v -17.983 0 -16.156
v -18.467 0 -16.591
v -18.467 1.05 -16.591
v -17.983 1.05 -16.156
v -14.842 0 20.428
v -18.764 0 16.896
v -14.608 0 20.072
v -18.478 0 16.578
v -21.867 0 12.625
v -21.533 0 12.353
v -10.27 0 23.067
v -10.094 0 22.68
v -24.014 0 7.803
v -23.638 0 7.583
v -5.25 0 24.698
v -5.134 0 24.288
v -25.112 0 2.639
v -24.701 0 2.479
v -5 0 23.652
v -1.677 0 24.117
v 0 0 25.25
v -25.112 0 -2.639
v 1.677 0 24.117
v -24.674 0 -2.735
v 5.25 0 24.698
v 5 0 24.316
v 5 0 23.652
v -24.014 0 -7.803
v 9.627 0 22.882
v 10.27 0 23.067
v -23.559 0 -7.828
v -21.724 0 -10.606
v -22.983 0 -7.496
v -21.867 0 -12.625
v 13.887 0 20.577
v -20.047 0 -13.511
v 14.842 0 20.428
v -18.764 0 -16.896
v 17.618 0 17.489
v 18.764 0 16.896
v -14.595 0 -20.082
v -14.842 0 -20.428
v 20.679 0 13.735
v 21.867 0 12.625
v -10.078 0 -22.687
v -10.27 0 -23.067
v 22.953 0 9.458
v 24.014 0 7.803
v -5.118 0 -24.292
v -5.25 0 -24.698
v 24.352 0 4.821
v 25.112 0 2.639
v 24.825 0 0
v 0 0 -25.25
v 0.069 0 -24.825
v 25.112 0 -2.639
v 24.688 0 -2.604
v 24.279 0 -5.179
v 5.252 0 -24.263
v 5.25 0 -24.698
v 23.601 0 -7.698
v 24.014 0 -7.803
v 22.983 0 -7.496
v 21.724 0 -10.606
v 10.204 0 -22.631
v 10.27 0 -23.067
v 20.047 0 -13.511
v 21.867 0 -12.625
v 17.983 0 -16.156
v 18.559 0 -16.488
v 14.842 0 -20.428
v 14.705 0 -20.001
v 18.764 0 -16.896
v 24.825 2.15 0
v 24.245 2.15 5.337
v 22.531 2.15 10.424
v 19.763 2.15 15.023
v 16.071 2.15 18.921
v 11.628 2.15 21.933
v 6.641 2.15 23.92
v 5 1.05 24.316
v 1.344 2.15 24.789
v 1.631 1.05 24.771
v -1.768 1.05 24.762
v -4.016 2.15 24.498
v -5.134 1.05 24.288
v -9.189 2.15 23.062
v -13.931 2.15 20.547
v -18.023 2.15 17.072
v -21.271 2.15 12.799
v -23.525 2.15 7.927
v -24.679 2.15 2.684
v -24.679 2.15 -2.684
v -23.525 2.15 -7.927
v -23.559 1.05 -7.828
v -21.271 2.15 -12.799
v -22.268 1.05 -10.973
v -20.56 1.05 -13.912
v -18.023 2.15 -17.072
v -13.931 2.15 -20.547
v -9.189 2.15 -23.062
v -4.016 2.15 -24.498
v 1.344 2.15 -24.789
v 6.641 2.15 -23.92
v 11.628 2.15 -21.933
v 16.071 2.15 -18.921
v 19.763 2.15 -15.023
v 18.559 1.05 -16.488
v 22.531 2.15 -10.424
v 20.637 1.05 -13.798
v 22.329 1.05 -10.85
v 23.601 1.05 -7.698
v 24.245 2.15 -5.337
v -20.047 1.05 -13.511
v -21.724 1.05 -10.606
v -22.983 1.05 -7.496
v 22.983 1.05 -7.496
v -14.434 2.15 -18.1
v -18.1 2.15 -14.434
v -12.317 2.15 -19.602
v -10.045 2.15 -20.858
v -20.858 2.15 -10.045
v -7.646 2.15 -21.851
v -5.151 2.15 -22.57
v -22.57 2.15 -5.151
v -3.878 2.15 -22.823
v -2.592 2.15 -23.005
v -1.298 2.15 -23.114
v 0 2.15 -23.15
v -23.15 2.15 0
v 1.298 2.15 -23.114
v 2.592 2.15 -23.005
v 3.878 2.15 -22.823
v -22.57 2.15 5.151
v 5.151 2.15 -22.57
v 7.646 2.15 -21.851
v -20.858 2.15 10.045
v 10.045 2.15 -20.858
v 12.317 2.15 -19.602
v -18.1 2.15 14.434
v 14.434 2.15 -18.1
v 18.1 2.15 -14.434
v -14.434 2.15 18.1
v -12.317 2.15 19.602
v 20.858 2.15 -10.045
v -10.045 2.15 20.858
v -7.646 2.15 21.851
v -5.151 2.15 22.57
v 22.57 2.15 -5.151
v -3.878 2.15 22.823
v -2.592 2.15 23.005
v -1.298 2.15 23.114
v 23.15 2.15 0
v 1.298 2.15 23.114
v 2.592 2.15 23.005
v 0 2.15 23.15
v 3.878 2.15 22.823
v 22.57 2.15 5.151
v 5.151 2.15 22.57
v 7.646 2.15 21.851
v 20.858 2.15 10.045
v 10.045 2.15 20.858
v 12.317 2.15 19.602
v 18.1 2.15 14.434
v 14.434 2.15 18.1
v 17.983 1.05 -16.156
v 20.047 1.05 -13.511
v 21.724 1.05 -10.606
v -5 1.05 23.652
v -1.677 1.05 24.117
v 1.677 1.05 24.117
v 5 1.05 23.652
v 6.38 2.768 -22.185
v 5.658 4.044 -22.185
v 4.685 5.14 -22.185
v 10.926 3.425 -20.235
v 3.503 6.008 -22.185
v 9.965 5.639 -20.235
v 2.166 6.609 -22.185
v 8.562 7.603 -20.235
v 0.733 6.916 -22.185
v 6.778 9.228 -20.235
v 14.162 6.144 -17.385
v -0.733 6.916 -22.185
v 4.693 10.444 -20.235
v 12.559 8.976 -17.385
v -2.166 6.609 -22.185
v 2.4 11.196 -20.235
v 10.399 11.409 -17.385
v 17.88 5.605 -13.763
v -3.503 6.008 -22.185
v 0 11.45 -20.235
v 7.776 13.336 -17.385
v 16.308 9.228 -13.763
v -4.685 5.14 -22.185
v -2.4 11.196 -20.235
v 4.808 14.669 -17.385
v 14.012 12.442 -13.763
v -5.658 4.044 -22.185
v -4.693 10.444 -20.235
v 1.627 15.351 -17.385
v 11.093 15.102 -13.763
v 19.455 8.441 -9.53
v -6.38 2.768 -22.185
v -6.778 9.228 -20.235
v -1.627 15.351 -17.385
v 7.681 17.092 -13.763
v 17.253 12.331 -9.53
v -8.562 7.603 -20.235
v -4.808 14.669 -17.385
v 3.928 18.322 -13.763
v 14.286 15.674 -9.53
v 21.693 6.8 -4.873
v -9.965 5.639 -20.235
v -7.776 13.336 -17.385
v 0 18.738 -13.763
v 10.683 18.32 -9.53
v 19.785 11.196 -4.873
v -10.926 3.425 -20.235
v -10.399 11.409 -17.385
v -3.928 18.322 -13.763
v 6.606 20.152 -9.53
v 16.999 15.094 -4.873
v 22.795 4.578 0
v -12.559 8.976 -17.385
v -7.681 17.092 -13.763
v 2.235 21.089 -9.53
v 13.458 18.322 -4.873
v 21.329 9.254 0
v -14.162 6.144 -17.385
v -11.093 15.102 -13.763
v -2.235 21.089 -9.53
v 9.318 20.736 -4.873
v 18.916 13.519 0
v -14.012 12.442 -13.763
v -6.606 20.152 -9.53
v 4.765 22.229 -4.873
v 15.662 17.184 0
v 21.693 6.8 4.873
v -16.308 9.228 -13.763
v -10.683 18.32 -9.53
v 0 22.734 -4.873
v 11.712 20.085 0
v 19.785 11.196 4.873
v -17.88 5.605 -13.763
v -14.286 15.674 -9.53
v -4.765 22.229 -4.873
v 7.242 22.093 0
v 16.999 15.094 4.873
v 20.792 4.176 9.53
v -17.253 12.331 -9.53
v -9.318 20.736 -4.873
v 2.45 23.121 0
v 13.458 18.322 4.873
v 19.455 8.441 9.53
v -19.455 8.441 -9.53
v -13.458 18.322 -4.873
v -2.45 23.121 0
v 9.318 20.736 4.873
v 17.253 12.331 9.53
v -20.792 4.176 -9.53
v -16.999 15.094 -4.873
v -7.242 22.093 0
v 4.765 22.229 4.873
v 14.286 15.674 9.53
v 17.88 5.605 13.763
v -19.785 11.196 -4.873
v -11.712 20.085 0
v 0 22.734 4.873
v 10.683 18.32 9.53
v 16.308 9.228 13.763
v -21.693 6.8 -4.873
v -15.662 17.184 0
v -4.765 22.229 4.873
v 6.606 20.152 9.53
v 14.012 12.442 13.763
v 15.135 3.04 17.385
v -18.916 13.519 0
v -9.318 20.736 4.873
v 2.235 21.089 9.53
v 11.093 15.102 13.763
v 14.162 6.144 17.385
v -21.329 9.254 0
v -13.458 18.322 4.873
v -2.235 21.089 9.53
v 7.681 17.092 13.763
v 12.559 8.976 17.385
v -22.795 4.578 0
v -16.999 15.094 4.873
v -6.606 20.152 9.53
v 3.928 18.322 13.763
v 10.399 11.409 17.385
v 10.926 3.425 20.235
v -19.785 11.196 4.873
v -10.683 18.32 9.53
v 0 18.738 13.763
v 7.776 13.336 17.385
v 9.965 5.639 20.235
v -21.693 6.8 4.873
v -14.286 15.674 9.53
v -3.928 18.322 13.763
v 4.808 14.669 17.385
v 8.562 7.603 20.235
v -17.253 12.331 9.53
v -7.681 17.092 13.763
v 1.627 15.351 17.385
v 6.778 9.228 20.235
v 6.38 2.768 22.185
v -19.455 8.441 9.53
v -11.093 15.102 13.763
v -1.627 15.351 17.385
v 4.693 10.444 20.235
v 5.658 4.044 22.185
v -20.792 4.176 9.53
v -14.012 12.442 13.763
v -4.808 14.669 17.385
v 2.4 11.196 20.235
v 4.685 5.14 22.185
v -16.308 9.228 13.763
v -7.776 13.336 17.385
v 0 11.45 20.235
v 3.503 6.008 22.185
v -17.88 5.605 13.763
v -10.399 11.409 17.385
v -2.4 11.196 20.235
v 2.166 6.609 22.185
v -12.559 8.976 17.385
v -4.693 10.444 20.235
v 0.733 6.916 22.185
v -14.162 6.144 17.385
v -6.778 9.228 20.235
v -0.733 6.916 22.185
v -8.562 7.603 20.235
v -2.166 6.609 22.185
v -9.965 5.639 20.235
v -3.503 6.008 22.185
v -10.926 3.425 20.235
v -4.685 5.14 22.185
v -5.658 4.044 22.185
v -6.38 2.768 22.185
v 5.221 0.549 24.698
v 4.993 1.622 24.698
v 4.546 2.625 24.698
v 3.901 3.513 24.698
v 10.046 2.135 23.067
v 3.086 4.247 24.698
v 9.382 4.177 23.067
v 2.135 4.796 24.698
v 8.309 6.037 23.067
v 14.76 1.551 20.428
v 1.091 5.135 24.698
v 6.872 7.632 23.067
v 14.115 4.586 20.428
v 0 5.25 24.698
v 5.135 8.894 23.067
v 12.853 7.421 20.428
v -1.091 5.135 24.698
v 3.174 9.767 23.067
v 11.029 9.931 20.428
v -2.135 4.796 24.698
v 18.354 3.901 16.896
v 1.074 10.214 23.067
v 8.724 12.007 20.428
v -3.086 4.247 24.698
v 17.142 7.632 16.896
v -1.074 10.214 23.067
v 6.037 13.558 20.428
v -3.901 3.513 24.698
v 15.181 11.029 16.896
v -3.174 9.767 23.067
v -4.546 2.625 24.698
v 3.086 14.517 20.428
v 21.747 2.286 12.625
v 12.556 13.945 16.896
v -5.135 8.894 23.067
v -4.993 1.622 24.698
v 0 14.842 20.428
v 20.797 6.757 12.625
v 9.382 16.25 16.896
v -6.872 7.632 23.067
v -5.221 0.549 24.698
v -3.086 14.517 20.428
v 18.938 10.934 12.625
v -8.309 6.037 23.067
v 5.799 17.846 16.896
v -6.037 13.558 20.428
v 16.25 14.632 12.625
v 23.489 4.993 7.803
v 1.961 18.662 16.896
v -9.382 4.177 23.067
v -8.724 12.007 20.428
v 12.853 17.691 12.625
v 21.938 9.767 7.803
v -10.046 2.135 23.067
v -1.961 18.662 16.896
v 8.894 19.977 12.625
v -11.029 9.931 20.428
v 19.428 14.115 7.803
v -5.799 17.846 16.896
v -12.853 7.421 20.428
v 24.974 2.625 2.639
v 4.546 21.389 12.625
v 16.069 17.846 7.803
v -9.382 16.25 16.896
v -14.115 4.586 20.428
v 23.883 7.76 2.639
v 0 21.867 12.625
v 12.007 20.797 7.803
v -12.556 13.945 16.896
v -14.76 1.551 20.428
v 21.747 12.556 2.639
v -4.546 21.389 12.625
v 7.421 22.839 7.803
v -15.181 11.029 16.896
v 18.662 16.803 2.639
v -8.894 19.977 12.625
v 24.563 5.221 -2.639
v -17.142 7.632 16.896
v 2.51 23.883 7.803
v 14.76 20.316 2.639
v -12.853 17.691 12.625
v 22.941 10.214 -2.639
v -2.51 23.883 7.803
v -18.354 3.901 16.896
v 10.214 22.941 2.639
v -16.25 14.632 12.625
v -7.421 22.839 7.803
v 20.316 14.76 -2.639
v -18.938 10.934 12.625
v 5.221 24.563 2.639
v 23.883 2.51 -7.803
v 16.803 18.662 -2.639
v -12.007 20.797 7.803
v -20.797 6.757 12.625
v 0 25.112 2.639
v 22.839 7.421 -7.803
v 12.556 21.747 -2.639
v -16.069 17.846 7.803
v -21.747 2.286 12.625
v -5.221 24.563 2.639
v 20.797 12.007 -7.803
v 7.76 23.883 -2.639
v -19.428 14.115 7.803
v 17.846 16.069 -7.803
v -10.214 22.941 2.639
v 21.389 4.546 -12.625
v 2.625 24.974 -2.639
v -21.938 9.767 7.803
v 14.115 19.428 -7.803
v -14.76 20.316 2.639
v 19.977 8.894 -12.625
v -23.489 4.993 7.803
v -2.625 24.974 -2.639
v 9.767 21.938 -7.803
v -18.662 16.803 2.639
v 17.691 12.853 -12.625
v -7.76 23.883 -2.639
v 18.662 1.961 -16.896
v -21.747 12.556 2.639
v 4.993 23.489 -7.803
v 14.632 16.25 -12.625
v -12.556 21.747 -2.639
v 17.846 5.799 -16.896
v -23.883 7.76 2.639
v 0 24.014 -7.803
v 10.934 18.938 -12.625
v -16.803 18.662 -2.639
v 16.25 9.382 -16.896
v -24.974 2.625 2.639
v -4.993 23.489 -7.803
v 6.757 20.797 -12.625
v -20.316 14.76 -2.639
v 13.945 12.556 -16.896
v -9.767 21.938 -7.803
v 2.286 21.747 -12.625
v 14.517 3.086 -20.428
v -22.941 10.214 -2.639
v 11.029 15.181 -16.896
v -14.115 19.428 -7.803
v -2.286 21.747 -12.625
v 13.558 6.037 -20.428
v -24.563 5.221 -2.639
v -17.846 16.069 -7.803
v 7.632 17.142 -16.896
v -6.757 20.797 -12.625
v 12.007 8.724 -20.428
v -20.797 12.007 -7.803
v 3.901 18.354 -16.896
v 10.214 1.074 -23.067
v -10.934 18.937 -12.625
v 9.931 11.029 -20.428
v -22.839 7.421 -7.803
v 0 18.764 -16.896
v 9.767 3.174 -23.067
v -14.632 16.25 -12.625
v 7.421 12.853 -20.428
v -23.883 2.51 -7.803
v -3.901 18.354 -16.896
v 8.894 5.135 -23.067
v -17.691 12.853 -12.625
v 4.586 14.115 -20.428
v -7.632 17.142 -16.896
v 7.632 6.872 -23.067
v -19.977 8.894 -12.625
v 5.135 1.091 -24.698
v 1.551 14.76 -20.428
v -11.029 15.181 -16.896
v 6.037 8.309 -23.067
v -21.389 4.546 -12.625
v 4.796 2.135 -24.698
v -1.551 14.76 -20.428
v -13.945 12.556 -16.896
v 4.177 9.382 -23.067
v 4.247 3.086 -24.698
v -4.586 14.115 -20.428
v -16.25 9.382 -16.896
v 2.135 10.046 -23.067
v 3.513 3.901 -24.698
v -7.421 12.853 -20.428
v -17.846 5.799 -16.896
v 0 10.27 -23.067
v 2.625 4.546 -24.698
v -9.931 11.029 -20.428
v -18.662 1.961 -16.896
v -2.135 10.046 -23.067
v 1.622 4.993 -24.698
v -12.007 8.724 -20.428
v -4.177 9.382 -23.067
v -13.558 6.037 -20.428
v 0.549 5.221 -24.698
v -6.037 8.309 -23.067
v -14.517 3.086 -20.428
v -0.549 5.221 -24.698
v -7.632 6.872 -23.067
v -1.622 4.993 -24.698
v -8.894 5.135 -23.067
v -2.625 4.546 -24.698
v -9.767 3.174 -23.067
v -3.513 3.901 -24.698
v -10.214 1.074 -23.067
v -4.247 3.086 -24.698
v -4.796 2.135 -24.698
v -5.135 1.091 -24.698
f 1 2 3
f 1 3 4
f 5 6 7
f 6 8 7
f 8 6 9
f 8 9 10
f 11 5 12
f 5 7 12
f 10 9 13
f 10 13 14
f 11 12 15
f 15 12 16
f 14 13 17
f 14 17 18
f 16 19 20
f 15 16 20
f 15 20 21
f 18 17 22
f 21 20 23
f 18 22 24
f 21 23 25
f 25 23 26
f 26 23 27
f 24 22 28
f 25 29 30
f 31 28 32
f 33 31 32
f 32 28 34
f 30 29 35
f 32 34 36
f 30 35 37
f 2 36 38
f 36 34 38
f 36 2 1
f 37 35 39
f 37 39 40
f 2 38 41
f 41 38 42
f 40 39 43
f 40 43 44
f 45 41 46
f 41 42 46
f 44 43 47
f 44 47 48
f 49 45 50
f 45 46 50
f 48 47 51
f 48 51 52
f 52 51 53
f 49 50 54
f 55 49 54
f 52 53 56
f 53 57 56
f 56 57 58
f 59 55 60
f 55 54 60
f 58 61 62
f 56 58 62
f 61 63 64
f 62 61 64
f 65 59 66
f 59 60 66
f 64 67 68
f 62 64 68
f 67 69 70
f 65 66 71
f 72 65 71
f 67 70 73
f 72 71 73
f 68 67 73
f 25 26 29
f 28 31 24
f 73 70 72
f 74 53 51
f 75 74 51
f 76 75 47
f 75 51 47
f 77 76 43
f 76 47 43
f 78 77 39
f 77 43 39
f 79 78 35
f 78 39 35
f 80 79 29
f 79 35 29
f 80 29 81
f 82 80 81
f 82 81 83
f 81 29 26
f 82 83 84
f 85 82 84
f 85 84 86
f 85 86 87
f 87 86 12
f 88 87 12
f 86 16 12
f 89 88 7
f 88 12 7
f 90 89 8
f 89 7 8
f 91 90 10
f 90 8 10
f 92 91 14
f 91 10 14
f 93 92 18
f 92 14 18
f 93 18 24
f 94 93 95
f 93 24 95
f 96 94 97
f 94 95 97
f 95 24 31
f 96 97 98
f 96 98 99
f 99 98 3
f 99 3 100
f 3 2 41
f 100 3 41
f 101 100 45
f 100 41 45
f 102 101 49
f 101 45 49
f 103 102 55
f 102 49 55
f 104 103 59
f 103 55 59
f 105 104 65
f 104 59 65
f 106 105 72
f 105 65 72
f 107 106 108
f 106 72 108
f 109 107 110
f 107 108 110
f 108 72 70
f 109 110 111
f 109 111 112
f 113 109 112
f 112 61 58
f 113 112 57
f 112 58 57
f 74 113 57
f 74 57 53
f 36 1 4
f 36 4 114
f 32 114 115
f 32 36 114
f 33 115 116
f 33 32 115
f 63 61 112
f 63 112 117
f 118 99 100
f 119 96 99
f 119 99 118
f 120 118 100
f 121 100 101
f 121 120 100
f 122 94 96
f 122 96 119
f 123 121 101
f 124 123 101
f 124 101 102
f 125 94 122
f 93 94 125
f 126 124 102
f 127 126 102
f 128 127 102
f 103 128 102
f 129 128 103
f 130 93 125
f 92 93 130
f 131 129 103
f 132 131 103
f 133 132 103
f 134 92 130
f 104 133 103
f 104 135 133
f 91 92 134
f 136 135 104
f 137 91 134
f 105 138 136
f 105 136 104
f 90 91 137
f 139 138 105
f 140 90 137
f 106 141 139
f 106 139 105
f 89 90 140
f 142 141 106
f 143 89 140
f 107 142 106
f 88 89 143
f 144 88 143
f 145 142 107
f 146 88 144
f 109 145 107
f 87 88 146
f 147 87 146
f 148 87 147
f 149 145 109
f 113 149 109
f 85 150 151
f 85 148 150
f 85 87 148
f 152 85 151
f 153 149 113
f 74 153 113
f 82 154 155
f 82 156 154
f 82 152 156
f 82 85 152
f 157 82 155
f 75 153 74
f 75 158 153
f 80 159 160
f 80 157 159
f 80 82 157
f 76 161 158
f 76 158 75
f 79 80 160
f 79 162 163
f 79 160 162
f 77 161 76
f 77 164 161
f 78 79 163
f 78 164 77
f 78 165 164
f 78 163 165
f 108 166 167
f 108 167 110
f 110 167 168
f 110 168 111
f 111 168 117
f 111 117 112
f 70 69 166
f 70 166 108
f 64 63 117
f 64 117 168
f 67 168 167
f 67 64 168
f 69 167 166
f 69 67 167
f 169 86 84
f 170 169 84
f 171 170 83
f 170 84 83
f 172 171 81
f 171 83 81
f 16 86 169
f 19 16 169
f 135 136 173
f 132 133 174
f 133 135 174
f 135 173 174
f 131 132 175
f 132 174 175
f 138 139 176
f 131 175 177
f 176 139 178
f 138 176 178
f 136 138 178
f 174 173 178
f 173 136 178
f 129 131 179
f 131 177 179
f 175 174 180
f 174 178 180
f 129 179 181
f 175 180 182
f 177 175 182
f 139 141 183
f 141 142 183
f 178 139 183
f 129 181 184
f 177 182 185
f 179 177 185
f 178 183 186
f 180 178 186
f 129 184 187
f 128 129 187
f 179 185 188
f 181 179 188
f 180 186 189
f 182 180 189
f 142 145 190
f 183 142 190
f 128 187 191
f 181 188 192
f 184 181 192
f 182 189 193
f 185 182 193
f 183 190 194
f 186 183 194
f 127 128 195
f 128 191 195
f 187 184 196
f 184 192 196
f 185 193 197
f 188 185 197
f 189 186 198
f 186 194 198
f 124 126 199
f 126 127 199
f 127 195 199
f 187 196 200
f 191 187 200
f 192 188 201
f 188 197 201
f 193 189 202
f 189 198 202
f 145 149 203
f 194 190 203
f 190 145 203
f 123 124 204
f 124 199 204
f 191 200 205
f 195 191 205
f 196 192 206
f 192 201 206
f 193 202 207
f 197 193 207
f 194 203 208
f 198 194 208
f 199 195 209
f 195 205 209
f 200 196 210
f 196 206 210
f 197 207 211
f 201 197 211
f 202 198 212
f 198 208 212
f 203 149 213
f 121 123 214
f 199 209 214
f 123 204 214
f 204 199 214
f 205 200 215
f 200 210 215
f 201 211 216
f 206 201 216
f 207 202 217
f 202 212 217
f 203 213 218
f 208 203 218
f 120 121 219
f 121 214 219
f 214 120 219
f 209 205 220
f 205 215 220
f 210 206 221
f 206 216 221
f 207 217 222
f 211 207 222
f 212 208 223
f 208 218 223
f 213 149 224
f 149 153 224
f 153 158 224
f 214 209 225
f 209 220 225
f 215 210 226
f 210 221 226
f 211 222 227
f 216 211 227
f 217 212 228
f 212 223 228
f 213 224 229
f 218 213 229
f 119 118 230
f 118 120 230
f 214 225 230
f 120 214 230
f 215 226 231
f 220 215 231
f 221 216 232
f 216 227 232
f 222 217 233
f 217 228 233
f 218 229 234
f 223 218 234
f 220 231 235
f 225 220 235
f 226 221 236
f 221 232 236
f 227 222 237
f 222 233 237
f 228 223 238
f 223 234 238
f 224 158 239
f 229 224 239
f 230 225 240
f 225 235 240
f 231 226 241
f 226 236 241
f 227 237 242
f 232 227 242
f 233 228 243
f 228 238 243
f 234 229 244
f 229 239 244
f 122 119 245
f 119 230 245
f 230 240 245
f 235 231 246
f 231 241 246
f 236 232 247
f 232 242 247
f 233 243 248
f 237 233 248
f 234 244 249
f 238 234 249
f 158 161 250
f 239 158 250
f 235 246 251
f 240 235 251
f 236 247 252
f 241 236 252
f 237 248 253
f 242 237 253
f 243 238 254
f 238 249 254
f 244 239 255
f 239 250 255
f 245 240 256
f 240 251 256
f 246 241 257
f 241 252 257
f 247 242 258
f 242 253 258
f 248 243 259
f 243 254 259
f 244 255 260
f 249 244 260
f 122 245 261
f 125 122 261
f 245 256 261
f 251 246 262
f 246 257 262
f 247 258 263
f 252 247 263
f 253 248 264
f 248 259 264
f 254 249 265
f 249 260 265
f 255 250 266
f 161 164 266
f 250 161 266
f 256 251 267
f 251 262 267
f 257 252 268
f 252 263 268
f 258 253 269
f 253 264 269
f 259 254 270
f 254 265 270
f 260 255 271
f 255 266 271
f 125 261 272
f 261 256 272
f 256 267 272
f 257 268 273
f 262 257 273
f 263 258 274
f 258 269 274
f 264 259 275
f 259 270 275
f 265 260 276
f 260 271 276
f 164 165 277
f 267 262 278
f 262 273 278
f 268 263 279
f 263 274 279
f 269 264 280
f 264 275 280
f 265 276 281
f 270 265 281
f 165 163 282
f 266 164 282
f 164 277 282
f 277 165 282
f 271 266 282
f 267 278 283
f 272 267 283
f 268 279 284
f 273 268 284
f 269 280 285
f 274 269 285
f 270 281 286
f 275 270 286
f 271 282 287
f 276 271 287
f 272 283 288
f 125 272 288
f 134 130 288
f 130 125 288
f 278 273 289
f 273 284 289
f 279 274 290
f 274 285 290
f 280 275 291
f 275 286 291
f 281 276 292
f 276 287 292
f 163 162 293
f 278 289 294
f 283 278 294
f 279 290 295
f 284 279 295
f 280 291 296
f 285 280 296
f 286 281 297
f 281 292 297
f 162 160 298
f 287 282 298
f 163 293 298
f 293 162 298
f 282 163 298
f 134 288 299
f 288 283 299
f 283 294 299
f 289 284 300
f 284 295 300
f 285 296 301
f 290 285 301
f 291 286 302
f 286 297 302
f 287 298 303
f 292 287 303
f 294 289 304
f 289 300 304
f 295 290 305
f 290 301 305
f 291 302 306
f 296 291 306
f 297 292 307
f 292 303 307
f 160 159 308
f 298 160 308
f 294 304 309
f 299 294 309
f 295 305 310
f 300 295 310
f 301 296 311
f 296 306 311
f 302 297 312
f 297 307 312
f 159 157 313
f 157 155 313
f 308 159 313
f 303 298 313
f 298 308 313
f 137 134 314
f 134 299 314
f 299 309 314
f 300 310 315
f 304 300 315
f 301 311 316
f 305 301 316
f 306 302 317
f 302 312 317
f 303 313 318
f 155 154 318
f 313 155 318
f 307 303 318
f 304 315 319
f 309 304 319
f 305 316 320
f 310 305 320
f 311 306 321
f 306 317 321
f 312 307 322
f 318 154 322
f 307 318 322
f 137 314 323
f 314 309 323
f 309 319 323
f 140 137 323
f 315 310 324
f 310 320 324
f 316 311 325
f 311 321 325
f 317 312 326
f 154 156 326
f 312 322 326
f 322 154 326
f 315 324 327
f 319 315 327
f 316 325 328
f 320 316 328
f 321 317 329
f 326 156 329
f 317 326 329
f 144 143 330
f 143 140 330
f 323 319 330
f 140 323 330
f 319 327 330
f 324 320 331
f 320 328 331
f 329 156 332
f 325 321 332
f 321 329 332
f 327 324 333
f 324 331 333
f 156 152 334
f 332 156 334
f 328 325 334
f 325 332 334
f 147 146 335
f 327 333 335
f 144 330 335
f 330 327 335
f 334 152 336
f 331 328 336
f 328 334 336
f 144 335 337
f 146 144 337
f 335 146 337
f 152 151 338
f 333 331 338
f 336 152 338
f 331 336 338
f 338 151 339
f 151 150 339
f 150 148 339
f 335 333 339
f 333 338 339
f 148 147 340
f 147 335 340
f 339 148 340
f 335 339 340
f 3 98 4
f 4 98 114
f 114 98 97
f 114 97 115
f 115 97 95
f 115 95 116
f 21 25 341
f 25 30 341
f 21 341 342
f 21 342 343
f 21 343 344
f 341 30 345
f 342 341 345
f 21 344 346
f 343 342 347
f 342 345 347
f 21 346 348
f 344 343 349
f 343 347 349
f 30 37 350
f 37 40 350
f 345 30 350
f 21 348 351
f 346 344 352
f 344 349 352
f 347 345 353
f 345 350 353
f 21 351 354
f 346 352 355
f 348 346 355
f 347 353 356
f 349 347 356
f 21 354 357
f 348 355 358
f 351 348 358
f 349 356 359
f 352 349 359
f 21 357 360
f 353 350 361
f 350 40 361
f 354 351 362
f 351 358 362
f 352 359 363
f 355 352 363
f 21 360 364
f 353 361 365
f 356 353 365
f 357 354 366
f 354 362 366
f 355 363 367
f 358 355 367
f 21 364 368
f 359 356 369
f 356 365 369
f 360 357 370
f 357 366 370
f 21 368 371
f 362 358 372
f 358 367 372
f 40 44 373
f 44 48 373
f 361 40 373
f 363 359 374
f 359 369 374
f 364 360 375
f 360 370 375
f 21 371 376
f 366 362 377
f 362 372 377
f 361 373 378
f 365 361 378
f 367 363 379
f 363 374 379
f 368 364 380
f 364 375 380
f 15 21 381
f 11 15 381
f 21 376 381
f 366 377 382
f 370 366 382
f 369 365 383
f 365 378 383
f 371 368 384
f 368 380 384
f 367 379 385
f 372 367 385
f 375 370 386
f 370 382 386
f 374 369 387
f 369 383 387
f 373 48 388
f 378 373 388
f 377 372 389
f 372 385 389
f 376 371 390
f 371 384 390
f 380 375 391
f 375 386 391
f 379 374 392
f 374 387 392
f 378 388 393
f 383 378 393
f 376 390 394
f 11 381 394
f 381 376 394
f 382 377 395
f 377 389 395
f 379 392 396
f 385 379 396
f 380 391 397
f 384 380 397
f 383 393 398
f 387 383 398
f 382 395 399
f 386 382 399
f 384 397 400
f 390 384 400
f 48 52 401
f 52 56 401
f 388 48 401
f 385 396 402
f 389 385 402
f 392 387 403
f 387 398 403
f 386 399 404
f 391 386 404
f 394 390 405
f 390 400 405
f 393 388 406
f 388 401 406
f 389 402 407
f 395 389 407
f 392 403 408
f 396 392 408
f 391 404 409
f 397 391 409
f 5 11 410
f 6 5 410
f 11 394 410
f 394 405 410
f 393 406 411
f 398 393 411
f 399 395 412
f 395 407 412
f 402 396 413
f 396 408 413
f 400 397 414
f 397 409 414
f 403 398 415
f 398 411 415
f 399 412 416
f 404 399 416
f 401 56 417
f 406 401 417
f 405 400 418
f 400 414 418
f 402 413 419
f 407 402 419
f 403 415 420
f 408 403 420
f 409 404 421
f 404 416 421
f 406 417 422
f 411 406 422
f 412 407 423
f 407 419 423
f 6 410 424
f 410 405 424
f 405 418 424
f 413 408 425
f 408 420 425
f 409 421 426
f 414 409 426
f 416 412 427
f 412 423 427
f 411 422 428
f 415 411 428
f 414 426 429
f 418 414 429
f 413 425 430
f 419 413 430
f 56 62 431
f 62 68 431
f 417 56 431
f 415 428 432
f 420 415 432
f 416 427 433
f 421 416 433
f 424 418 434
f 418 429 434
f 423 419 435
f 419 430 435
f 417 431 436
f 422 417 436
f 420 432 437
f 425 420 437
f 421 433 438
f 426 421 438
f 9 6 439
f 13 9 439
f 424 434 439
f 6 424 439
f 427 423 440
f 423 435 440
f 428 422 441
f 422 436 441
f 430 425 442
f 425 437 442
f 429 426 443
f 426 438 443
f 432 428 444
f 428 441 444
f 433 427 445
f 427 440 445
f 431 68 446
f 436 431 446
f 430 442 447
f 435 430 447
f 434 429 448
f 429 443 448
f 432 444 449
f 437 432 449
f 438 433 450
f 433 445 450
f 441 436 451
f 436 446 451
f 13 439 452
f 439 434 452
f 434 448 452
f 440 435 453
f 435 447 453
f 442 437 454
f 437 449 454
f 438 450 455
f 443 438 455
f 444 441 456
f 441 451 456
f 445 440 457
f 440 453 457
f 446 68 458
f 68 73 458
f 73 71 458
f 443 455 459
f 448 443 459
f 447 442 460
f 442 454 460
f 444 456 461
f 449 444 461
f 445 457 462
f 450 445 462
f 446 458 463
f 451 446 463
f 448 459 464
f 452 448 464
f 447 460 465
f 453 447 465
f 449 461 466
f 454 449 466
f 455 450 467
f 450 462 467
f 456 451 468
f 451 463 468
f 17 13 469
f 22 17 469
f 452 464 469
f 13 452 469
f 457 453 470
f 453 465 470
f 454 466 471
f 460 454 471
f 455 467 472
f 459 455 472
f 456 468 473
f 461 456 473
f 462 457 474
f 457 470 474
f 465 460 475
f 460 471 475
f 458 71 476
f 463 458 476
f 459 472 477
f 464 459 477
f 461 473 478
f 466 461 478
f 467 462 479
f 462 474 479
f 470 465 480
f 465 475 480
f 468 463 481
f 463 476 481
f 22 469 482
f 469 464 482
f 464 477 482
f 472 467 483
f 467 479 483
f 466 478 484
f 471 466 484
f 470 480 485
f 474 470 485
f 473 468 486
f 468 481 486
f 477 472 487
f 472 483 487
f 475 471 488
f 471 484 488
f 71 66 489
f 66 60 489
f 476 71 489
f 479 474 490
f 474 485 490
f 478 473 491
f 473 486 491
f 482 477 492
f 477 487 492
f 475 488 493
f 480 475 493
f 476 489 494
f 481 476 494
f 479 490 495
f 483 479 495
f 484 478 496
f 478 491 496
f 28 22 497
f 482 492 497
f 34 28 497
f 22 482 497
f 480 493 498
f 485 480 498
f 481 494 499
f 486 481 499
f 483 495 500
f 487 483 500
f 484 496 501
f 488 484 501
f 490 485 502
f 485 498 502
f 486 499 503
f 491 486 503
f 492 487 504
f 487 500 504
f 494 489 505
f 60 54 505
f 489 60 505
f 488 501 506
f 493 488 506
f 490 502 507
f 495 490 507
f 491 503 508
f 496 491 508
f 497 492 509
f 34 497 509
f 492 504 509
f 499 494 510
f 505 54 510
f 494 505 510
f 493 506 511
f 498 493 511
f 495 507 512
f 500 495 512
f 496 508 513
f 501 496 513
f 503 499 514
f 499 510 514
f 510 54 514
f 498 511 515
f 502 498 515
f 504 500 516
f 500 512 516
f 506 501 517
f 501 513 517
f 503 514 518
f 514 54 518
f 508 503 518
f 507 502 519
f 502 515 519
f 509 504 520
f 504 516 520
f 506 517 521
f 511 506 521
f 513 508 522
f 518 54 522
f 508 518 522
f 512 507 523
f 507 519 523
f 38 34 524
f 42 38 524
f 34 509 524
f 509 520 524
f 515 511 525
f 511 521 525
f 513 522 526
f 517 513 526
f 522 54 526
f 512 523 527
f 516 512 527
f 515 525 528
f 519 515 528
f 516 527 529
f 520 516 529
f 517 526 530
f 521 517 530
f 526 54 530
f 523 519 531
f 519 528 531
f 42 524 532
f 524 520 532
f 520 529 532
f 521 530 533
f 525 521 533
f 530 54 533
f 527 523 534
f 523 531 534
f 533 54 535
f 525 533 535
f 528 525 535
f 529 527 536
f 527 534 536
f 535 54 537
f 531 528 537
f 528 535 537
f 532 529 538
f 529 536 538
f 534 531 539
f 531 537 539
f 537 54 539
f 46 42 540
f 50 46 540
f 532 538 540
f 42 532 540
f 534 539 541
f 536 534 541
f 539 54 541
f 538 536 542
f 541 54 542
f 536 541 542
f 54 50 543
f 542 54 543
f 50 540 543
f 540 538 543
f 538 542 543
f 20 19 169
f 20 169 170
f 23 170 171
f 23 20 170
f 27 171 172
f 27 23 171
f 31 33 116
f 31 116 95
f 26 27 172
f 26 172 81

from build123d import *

# Parameters (mm, degrees)
REVOLVE1_ANGLE      = 180
SKETCH2_R           = 24.825
SKETCH2_R_2         = 23
CUT_EXTRUDE1_DEPTH  = 2.15
BOSS_EXTRUDE1_DEPTH = 1.05


with BuildPart() as part:
    # Sketch1 → Revolve1 (revolve)
    with BuildSketch(Plane(origin=(0, 0, 0), x_dir=(1, 0, 0), z_dir=(0, 1, 0))):
        with BuildLine():
            Line((0, 25.25), (0, 23.25))
            ThreePointArc((0, 23.25), (23.25, 0), (0, -23.25))
            Line((0, -23.25), (0, -25.25))
            ThreePointArc((0, -25.25), (25.25, 0), (0, 25.25))
        make_face()
    revolve(axis=Axis((0, 0, 23.25), (0, 0, 1)), revolution_arc=REVOLVE1_ANGLE)

    # Sketch2 → Cut-Extrude1 (cut)
    with BuildSketch(Plane.XZ):
        Circle(SKETCH2_R)
        Circle(SKETCH2_R_2, mode=Mode.SUBTRACT)
    extrude(amount=-CUT_EXTRUDE1_DEPTH, mode=Mode.SUBTRACT)

    # Sketch3 → Boss-Extrude1 (add)
    with BuildSketch(Plane.XZ):
        with BuildLine():
            Line((-5.134436401, 24.288231468), (-5, 23.65228583))
            ThreePointArc((-5, 23.65228583), (0, 24.175), (5, 23.65228583))
            Line((5, 23.65228583), (5, 24.316262562))
            ThreePointArc((5, 24.316262562), (-0.068663834, 24.824905041), (-5.134436401, 24.288231468))
        make_face()
        with BuildLine():
            Line((23.601443665, -7.697563376), (22.983480387, -7.496015896))
            ThreePointArc((22.983480387, -7.496015896), (20.936164136, -12.0875), (17.983480387, -16.156269934))
            Line((17.983480387, -16.156269934), (18.558501104, -16.4882583))
            ThreePointArc((18.558501104, -16.4882583), (21.533330329, -12.352987896), (23.601443665, -7.697563376))
        make_face()
        with BuildLine():
            Line((-18.467007264, -16.590668092), (-17.983480387, -16.156269934))
            ThreePointArc((-17.983480387, -16.156269934), (-20.936164136, -12.0875), (-22.983480387, -7.496015896))
            Line((-22.983480387, -7.496015896), (-23.558501104, -7.828004262))
            ThreePointArc((-23.558501104, -7.828004262), (-21.464666495, -12.471917145), (-18.467007264, -16.590668092))
        make_face()
    extrude(amount=-BOSS_EXTRUDE1_DEPTH)


solid = part.part
